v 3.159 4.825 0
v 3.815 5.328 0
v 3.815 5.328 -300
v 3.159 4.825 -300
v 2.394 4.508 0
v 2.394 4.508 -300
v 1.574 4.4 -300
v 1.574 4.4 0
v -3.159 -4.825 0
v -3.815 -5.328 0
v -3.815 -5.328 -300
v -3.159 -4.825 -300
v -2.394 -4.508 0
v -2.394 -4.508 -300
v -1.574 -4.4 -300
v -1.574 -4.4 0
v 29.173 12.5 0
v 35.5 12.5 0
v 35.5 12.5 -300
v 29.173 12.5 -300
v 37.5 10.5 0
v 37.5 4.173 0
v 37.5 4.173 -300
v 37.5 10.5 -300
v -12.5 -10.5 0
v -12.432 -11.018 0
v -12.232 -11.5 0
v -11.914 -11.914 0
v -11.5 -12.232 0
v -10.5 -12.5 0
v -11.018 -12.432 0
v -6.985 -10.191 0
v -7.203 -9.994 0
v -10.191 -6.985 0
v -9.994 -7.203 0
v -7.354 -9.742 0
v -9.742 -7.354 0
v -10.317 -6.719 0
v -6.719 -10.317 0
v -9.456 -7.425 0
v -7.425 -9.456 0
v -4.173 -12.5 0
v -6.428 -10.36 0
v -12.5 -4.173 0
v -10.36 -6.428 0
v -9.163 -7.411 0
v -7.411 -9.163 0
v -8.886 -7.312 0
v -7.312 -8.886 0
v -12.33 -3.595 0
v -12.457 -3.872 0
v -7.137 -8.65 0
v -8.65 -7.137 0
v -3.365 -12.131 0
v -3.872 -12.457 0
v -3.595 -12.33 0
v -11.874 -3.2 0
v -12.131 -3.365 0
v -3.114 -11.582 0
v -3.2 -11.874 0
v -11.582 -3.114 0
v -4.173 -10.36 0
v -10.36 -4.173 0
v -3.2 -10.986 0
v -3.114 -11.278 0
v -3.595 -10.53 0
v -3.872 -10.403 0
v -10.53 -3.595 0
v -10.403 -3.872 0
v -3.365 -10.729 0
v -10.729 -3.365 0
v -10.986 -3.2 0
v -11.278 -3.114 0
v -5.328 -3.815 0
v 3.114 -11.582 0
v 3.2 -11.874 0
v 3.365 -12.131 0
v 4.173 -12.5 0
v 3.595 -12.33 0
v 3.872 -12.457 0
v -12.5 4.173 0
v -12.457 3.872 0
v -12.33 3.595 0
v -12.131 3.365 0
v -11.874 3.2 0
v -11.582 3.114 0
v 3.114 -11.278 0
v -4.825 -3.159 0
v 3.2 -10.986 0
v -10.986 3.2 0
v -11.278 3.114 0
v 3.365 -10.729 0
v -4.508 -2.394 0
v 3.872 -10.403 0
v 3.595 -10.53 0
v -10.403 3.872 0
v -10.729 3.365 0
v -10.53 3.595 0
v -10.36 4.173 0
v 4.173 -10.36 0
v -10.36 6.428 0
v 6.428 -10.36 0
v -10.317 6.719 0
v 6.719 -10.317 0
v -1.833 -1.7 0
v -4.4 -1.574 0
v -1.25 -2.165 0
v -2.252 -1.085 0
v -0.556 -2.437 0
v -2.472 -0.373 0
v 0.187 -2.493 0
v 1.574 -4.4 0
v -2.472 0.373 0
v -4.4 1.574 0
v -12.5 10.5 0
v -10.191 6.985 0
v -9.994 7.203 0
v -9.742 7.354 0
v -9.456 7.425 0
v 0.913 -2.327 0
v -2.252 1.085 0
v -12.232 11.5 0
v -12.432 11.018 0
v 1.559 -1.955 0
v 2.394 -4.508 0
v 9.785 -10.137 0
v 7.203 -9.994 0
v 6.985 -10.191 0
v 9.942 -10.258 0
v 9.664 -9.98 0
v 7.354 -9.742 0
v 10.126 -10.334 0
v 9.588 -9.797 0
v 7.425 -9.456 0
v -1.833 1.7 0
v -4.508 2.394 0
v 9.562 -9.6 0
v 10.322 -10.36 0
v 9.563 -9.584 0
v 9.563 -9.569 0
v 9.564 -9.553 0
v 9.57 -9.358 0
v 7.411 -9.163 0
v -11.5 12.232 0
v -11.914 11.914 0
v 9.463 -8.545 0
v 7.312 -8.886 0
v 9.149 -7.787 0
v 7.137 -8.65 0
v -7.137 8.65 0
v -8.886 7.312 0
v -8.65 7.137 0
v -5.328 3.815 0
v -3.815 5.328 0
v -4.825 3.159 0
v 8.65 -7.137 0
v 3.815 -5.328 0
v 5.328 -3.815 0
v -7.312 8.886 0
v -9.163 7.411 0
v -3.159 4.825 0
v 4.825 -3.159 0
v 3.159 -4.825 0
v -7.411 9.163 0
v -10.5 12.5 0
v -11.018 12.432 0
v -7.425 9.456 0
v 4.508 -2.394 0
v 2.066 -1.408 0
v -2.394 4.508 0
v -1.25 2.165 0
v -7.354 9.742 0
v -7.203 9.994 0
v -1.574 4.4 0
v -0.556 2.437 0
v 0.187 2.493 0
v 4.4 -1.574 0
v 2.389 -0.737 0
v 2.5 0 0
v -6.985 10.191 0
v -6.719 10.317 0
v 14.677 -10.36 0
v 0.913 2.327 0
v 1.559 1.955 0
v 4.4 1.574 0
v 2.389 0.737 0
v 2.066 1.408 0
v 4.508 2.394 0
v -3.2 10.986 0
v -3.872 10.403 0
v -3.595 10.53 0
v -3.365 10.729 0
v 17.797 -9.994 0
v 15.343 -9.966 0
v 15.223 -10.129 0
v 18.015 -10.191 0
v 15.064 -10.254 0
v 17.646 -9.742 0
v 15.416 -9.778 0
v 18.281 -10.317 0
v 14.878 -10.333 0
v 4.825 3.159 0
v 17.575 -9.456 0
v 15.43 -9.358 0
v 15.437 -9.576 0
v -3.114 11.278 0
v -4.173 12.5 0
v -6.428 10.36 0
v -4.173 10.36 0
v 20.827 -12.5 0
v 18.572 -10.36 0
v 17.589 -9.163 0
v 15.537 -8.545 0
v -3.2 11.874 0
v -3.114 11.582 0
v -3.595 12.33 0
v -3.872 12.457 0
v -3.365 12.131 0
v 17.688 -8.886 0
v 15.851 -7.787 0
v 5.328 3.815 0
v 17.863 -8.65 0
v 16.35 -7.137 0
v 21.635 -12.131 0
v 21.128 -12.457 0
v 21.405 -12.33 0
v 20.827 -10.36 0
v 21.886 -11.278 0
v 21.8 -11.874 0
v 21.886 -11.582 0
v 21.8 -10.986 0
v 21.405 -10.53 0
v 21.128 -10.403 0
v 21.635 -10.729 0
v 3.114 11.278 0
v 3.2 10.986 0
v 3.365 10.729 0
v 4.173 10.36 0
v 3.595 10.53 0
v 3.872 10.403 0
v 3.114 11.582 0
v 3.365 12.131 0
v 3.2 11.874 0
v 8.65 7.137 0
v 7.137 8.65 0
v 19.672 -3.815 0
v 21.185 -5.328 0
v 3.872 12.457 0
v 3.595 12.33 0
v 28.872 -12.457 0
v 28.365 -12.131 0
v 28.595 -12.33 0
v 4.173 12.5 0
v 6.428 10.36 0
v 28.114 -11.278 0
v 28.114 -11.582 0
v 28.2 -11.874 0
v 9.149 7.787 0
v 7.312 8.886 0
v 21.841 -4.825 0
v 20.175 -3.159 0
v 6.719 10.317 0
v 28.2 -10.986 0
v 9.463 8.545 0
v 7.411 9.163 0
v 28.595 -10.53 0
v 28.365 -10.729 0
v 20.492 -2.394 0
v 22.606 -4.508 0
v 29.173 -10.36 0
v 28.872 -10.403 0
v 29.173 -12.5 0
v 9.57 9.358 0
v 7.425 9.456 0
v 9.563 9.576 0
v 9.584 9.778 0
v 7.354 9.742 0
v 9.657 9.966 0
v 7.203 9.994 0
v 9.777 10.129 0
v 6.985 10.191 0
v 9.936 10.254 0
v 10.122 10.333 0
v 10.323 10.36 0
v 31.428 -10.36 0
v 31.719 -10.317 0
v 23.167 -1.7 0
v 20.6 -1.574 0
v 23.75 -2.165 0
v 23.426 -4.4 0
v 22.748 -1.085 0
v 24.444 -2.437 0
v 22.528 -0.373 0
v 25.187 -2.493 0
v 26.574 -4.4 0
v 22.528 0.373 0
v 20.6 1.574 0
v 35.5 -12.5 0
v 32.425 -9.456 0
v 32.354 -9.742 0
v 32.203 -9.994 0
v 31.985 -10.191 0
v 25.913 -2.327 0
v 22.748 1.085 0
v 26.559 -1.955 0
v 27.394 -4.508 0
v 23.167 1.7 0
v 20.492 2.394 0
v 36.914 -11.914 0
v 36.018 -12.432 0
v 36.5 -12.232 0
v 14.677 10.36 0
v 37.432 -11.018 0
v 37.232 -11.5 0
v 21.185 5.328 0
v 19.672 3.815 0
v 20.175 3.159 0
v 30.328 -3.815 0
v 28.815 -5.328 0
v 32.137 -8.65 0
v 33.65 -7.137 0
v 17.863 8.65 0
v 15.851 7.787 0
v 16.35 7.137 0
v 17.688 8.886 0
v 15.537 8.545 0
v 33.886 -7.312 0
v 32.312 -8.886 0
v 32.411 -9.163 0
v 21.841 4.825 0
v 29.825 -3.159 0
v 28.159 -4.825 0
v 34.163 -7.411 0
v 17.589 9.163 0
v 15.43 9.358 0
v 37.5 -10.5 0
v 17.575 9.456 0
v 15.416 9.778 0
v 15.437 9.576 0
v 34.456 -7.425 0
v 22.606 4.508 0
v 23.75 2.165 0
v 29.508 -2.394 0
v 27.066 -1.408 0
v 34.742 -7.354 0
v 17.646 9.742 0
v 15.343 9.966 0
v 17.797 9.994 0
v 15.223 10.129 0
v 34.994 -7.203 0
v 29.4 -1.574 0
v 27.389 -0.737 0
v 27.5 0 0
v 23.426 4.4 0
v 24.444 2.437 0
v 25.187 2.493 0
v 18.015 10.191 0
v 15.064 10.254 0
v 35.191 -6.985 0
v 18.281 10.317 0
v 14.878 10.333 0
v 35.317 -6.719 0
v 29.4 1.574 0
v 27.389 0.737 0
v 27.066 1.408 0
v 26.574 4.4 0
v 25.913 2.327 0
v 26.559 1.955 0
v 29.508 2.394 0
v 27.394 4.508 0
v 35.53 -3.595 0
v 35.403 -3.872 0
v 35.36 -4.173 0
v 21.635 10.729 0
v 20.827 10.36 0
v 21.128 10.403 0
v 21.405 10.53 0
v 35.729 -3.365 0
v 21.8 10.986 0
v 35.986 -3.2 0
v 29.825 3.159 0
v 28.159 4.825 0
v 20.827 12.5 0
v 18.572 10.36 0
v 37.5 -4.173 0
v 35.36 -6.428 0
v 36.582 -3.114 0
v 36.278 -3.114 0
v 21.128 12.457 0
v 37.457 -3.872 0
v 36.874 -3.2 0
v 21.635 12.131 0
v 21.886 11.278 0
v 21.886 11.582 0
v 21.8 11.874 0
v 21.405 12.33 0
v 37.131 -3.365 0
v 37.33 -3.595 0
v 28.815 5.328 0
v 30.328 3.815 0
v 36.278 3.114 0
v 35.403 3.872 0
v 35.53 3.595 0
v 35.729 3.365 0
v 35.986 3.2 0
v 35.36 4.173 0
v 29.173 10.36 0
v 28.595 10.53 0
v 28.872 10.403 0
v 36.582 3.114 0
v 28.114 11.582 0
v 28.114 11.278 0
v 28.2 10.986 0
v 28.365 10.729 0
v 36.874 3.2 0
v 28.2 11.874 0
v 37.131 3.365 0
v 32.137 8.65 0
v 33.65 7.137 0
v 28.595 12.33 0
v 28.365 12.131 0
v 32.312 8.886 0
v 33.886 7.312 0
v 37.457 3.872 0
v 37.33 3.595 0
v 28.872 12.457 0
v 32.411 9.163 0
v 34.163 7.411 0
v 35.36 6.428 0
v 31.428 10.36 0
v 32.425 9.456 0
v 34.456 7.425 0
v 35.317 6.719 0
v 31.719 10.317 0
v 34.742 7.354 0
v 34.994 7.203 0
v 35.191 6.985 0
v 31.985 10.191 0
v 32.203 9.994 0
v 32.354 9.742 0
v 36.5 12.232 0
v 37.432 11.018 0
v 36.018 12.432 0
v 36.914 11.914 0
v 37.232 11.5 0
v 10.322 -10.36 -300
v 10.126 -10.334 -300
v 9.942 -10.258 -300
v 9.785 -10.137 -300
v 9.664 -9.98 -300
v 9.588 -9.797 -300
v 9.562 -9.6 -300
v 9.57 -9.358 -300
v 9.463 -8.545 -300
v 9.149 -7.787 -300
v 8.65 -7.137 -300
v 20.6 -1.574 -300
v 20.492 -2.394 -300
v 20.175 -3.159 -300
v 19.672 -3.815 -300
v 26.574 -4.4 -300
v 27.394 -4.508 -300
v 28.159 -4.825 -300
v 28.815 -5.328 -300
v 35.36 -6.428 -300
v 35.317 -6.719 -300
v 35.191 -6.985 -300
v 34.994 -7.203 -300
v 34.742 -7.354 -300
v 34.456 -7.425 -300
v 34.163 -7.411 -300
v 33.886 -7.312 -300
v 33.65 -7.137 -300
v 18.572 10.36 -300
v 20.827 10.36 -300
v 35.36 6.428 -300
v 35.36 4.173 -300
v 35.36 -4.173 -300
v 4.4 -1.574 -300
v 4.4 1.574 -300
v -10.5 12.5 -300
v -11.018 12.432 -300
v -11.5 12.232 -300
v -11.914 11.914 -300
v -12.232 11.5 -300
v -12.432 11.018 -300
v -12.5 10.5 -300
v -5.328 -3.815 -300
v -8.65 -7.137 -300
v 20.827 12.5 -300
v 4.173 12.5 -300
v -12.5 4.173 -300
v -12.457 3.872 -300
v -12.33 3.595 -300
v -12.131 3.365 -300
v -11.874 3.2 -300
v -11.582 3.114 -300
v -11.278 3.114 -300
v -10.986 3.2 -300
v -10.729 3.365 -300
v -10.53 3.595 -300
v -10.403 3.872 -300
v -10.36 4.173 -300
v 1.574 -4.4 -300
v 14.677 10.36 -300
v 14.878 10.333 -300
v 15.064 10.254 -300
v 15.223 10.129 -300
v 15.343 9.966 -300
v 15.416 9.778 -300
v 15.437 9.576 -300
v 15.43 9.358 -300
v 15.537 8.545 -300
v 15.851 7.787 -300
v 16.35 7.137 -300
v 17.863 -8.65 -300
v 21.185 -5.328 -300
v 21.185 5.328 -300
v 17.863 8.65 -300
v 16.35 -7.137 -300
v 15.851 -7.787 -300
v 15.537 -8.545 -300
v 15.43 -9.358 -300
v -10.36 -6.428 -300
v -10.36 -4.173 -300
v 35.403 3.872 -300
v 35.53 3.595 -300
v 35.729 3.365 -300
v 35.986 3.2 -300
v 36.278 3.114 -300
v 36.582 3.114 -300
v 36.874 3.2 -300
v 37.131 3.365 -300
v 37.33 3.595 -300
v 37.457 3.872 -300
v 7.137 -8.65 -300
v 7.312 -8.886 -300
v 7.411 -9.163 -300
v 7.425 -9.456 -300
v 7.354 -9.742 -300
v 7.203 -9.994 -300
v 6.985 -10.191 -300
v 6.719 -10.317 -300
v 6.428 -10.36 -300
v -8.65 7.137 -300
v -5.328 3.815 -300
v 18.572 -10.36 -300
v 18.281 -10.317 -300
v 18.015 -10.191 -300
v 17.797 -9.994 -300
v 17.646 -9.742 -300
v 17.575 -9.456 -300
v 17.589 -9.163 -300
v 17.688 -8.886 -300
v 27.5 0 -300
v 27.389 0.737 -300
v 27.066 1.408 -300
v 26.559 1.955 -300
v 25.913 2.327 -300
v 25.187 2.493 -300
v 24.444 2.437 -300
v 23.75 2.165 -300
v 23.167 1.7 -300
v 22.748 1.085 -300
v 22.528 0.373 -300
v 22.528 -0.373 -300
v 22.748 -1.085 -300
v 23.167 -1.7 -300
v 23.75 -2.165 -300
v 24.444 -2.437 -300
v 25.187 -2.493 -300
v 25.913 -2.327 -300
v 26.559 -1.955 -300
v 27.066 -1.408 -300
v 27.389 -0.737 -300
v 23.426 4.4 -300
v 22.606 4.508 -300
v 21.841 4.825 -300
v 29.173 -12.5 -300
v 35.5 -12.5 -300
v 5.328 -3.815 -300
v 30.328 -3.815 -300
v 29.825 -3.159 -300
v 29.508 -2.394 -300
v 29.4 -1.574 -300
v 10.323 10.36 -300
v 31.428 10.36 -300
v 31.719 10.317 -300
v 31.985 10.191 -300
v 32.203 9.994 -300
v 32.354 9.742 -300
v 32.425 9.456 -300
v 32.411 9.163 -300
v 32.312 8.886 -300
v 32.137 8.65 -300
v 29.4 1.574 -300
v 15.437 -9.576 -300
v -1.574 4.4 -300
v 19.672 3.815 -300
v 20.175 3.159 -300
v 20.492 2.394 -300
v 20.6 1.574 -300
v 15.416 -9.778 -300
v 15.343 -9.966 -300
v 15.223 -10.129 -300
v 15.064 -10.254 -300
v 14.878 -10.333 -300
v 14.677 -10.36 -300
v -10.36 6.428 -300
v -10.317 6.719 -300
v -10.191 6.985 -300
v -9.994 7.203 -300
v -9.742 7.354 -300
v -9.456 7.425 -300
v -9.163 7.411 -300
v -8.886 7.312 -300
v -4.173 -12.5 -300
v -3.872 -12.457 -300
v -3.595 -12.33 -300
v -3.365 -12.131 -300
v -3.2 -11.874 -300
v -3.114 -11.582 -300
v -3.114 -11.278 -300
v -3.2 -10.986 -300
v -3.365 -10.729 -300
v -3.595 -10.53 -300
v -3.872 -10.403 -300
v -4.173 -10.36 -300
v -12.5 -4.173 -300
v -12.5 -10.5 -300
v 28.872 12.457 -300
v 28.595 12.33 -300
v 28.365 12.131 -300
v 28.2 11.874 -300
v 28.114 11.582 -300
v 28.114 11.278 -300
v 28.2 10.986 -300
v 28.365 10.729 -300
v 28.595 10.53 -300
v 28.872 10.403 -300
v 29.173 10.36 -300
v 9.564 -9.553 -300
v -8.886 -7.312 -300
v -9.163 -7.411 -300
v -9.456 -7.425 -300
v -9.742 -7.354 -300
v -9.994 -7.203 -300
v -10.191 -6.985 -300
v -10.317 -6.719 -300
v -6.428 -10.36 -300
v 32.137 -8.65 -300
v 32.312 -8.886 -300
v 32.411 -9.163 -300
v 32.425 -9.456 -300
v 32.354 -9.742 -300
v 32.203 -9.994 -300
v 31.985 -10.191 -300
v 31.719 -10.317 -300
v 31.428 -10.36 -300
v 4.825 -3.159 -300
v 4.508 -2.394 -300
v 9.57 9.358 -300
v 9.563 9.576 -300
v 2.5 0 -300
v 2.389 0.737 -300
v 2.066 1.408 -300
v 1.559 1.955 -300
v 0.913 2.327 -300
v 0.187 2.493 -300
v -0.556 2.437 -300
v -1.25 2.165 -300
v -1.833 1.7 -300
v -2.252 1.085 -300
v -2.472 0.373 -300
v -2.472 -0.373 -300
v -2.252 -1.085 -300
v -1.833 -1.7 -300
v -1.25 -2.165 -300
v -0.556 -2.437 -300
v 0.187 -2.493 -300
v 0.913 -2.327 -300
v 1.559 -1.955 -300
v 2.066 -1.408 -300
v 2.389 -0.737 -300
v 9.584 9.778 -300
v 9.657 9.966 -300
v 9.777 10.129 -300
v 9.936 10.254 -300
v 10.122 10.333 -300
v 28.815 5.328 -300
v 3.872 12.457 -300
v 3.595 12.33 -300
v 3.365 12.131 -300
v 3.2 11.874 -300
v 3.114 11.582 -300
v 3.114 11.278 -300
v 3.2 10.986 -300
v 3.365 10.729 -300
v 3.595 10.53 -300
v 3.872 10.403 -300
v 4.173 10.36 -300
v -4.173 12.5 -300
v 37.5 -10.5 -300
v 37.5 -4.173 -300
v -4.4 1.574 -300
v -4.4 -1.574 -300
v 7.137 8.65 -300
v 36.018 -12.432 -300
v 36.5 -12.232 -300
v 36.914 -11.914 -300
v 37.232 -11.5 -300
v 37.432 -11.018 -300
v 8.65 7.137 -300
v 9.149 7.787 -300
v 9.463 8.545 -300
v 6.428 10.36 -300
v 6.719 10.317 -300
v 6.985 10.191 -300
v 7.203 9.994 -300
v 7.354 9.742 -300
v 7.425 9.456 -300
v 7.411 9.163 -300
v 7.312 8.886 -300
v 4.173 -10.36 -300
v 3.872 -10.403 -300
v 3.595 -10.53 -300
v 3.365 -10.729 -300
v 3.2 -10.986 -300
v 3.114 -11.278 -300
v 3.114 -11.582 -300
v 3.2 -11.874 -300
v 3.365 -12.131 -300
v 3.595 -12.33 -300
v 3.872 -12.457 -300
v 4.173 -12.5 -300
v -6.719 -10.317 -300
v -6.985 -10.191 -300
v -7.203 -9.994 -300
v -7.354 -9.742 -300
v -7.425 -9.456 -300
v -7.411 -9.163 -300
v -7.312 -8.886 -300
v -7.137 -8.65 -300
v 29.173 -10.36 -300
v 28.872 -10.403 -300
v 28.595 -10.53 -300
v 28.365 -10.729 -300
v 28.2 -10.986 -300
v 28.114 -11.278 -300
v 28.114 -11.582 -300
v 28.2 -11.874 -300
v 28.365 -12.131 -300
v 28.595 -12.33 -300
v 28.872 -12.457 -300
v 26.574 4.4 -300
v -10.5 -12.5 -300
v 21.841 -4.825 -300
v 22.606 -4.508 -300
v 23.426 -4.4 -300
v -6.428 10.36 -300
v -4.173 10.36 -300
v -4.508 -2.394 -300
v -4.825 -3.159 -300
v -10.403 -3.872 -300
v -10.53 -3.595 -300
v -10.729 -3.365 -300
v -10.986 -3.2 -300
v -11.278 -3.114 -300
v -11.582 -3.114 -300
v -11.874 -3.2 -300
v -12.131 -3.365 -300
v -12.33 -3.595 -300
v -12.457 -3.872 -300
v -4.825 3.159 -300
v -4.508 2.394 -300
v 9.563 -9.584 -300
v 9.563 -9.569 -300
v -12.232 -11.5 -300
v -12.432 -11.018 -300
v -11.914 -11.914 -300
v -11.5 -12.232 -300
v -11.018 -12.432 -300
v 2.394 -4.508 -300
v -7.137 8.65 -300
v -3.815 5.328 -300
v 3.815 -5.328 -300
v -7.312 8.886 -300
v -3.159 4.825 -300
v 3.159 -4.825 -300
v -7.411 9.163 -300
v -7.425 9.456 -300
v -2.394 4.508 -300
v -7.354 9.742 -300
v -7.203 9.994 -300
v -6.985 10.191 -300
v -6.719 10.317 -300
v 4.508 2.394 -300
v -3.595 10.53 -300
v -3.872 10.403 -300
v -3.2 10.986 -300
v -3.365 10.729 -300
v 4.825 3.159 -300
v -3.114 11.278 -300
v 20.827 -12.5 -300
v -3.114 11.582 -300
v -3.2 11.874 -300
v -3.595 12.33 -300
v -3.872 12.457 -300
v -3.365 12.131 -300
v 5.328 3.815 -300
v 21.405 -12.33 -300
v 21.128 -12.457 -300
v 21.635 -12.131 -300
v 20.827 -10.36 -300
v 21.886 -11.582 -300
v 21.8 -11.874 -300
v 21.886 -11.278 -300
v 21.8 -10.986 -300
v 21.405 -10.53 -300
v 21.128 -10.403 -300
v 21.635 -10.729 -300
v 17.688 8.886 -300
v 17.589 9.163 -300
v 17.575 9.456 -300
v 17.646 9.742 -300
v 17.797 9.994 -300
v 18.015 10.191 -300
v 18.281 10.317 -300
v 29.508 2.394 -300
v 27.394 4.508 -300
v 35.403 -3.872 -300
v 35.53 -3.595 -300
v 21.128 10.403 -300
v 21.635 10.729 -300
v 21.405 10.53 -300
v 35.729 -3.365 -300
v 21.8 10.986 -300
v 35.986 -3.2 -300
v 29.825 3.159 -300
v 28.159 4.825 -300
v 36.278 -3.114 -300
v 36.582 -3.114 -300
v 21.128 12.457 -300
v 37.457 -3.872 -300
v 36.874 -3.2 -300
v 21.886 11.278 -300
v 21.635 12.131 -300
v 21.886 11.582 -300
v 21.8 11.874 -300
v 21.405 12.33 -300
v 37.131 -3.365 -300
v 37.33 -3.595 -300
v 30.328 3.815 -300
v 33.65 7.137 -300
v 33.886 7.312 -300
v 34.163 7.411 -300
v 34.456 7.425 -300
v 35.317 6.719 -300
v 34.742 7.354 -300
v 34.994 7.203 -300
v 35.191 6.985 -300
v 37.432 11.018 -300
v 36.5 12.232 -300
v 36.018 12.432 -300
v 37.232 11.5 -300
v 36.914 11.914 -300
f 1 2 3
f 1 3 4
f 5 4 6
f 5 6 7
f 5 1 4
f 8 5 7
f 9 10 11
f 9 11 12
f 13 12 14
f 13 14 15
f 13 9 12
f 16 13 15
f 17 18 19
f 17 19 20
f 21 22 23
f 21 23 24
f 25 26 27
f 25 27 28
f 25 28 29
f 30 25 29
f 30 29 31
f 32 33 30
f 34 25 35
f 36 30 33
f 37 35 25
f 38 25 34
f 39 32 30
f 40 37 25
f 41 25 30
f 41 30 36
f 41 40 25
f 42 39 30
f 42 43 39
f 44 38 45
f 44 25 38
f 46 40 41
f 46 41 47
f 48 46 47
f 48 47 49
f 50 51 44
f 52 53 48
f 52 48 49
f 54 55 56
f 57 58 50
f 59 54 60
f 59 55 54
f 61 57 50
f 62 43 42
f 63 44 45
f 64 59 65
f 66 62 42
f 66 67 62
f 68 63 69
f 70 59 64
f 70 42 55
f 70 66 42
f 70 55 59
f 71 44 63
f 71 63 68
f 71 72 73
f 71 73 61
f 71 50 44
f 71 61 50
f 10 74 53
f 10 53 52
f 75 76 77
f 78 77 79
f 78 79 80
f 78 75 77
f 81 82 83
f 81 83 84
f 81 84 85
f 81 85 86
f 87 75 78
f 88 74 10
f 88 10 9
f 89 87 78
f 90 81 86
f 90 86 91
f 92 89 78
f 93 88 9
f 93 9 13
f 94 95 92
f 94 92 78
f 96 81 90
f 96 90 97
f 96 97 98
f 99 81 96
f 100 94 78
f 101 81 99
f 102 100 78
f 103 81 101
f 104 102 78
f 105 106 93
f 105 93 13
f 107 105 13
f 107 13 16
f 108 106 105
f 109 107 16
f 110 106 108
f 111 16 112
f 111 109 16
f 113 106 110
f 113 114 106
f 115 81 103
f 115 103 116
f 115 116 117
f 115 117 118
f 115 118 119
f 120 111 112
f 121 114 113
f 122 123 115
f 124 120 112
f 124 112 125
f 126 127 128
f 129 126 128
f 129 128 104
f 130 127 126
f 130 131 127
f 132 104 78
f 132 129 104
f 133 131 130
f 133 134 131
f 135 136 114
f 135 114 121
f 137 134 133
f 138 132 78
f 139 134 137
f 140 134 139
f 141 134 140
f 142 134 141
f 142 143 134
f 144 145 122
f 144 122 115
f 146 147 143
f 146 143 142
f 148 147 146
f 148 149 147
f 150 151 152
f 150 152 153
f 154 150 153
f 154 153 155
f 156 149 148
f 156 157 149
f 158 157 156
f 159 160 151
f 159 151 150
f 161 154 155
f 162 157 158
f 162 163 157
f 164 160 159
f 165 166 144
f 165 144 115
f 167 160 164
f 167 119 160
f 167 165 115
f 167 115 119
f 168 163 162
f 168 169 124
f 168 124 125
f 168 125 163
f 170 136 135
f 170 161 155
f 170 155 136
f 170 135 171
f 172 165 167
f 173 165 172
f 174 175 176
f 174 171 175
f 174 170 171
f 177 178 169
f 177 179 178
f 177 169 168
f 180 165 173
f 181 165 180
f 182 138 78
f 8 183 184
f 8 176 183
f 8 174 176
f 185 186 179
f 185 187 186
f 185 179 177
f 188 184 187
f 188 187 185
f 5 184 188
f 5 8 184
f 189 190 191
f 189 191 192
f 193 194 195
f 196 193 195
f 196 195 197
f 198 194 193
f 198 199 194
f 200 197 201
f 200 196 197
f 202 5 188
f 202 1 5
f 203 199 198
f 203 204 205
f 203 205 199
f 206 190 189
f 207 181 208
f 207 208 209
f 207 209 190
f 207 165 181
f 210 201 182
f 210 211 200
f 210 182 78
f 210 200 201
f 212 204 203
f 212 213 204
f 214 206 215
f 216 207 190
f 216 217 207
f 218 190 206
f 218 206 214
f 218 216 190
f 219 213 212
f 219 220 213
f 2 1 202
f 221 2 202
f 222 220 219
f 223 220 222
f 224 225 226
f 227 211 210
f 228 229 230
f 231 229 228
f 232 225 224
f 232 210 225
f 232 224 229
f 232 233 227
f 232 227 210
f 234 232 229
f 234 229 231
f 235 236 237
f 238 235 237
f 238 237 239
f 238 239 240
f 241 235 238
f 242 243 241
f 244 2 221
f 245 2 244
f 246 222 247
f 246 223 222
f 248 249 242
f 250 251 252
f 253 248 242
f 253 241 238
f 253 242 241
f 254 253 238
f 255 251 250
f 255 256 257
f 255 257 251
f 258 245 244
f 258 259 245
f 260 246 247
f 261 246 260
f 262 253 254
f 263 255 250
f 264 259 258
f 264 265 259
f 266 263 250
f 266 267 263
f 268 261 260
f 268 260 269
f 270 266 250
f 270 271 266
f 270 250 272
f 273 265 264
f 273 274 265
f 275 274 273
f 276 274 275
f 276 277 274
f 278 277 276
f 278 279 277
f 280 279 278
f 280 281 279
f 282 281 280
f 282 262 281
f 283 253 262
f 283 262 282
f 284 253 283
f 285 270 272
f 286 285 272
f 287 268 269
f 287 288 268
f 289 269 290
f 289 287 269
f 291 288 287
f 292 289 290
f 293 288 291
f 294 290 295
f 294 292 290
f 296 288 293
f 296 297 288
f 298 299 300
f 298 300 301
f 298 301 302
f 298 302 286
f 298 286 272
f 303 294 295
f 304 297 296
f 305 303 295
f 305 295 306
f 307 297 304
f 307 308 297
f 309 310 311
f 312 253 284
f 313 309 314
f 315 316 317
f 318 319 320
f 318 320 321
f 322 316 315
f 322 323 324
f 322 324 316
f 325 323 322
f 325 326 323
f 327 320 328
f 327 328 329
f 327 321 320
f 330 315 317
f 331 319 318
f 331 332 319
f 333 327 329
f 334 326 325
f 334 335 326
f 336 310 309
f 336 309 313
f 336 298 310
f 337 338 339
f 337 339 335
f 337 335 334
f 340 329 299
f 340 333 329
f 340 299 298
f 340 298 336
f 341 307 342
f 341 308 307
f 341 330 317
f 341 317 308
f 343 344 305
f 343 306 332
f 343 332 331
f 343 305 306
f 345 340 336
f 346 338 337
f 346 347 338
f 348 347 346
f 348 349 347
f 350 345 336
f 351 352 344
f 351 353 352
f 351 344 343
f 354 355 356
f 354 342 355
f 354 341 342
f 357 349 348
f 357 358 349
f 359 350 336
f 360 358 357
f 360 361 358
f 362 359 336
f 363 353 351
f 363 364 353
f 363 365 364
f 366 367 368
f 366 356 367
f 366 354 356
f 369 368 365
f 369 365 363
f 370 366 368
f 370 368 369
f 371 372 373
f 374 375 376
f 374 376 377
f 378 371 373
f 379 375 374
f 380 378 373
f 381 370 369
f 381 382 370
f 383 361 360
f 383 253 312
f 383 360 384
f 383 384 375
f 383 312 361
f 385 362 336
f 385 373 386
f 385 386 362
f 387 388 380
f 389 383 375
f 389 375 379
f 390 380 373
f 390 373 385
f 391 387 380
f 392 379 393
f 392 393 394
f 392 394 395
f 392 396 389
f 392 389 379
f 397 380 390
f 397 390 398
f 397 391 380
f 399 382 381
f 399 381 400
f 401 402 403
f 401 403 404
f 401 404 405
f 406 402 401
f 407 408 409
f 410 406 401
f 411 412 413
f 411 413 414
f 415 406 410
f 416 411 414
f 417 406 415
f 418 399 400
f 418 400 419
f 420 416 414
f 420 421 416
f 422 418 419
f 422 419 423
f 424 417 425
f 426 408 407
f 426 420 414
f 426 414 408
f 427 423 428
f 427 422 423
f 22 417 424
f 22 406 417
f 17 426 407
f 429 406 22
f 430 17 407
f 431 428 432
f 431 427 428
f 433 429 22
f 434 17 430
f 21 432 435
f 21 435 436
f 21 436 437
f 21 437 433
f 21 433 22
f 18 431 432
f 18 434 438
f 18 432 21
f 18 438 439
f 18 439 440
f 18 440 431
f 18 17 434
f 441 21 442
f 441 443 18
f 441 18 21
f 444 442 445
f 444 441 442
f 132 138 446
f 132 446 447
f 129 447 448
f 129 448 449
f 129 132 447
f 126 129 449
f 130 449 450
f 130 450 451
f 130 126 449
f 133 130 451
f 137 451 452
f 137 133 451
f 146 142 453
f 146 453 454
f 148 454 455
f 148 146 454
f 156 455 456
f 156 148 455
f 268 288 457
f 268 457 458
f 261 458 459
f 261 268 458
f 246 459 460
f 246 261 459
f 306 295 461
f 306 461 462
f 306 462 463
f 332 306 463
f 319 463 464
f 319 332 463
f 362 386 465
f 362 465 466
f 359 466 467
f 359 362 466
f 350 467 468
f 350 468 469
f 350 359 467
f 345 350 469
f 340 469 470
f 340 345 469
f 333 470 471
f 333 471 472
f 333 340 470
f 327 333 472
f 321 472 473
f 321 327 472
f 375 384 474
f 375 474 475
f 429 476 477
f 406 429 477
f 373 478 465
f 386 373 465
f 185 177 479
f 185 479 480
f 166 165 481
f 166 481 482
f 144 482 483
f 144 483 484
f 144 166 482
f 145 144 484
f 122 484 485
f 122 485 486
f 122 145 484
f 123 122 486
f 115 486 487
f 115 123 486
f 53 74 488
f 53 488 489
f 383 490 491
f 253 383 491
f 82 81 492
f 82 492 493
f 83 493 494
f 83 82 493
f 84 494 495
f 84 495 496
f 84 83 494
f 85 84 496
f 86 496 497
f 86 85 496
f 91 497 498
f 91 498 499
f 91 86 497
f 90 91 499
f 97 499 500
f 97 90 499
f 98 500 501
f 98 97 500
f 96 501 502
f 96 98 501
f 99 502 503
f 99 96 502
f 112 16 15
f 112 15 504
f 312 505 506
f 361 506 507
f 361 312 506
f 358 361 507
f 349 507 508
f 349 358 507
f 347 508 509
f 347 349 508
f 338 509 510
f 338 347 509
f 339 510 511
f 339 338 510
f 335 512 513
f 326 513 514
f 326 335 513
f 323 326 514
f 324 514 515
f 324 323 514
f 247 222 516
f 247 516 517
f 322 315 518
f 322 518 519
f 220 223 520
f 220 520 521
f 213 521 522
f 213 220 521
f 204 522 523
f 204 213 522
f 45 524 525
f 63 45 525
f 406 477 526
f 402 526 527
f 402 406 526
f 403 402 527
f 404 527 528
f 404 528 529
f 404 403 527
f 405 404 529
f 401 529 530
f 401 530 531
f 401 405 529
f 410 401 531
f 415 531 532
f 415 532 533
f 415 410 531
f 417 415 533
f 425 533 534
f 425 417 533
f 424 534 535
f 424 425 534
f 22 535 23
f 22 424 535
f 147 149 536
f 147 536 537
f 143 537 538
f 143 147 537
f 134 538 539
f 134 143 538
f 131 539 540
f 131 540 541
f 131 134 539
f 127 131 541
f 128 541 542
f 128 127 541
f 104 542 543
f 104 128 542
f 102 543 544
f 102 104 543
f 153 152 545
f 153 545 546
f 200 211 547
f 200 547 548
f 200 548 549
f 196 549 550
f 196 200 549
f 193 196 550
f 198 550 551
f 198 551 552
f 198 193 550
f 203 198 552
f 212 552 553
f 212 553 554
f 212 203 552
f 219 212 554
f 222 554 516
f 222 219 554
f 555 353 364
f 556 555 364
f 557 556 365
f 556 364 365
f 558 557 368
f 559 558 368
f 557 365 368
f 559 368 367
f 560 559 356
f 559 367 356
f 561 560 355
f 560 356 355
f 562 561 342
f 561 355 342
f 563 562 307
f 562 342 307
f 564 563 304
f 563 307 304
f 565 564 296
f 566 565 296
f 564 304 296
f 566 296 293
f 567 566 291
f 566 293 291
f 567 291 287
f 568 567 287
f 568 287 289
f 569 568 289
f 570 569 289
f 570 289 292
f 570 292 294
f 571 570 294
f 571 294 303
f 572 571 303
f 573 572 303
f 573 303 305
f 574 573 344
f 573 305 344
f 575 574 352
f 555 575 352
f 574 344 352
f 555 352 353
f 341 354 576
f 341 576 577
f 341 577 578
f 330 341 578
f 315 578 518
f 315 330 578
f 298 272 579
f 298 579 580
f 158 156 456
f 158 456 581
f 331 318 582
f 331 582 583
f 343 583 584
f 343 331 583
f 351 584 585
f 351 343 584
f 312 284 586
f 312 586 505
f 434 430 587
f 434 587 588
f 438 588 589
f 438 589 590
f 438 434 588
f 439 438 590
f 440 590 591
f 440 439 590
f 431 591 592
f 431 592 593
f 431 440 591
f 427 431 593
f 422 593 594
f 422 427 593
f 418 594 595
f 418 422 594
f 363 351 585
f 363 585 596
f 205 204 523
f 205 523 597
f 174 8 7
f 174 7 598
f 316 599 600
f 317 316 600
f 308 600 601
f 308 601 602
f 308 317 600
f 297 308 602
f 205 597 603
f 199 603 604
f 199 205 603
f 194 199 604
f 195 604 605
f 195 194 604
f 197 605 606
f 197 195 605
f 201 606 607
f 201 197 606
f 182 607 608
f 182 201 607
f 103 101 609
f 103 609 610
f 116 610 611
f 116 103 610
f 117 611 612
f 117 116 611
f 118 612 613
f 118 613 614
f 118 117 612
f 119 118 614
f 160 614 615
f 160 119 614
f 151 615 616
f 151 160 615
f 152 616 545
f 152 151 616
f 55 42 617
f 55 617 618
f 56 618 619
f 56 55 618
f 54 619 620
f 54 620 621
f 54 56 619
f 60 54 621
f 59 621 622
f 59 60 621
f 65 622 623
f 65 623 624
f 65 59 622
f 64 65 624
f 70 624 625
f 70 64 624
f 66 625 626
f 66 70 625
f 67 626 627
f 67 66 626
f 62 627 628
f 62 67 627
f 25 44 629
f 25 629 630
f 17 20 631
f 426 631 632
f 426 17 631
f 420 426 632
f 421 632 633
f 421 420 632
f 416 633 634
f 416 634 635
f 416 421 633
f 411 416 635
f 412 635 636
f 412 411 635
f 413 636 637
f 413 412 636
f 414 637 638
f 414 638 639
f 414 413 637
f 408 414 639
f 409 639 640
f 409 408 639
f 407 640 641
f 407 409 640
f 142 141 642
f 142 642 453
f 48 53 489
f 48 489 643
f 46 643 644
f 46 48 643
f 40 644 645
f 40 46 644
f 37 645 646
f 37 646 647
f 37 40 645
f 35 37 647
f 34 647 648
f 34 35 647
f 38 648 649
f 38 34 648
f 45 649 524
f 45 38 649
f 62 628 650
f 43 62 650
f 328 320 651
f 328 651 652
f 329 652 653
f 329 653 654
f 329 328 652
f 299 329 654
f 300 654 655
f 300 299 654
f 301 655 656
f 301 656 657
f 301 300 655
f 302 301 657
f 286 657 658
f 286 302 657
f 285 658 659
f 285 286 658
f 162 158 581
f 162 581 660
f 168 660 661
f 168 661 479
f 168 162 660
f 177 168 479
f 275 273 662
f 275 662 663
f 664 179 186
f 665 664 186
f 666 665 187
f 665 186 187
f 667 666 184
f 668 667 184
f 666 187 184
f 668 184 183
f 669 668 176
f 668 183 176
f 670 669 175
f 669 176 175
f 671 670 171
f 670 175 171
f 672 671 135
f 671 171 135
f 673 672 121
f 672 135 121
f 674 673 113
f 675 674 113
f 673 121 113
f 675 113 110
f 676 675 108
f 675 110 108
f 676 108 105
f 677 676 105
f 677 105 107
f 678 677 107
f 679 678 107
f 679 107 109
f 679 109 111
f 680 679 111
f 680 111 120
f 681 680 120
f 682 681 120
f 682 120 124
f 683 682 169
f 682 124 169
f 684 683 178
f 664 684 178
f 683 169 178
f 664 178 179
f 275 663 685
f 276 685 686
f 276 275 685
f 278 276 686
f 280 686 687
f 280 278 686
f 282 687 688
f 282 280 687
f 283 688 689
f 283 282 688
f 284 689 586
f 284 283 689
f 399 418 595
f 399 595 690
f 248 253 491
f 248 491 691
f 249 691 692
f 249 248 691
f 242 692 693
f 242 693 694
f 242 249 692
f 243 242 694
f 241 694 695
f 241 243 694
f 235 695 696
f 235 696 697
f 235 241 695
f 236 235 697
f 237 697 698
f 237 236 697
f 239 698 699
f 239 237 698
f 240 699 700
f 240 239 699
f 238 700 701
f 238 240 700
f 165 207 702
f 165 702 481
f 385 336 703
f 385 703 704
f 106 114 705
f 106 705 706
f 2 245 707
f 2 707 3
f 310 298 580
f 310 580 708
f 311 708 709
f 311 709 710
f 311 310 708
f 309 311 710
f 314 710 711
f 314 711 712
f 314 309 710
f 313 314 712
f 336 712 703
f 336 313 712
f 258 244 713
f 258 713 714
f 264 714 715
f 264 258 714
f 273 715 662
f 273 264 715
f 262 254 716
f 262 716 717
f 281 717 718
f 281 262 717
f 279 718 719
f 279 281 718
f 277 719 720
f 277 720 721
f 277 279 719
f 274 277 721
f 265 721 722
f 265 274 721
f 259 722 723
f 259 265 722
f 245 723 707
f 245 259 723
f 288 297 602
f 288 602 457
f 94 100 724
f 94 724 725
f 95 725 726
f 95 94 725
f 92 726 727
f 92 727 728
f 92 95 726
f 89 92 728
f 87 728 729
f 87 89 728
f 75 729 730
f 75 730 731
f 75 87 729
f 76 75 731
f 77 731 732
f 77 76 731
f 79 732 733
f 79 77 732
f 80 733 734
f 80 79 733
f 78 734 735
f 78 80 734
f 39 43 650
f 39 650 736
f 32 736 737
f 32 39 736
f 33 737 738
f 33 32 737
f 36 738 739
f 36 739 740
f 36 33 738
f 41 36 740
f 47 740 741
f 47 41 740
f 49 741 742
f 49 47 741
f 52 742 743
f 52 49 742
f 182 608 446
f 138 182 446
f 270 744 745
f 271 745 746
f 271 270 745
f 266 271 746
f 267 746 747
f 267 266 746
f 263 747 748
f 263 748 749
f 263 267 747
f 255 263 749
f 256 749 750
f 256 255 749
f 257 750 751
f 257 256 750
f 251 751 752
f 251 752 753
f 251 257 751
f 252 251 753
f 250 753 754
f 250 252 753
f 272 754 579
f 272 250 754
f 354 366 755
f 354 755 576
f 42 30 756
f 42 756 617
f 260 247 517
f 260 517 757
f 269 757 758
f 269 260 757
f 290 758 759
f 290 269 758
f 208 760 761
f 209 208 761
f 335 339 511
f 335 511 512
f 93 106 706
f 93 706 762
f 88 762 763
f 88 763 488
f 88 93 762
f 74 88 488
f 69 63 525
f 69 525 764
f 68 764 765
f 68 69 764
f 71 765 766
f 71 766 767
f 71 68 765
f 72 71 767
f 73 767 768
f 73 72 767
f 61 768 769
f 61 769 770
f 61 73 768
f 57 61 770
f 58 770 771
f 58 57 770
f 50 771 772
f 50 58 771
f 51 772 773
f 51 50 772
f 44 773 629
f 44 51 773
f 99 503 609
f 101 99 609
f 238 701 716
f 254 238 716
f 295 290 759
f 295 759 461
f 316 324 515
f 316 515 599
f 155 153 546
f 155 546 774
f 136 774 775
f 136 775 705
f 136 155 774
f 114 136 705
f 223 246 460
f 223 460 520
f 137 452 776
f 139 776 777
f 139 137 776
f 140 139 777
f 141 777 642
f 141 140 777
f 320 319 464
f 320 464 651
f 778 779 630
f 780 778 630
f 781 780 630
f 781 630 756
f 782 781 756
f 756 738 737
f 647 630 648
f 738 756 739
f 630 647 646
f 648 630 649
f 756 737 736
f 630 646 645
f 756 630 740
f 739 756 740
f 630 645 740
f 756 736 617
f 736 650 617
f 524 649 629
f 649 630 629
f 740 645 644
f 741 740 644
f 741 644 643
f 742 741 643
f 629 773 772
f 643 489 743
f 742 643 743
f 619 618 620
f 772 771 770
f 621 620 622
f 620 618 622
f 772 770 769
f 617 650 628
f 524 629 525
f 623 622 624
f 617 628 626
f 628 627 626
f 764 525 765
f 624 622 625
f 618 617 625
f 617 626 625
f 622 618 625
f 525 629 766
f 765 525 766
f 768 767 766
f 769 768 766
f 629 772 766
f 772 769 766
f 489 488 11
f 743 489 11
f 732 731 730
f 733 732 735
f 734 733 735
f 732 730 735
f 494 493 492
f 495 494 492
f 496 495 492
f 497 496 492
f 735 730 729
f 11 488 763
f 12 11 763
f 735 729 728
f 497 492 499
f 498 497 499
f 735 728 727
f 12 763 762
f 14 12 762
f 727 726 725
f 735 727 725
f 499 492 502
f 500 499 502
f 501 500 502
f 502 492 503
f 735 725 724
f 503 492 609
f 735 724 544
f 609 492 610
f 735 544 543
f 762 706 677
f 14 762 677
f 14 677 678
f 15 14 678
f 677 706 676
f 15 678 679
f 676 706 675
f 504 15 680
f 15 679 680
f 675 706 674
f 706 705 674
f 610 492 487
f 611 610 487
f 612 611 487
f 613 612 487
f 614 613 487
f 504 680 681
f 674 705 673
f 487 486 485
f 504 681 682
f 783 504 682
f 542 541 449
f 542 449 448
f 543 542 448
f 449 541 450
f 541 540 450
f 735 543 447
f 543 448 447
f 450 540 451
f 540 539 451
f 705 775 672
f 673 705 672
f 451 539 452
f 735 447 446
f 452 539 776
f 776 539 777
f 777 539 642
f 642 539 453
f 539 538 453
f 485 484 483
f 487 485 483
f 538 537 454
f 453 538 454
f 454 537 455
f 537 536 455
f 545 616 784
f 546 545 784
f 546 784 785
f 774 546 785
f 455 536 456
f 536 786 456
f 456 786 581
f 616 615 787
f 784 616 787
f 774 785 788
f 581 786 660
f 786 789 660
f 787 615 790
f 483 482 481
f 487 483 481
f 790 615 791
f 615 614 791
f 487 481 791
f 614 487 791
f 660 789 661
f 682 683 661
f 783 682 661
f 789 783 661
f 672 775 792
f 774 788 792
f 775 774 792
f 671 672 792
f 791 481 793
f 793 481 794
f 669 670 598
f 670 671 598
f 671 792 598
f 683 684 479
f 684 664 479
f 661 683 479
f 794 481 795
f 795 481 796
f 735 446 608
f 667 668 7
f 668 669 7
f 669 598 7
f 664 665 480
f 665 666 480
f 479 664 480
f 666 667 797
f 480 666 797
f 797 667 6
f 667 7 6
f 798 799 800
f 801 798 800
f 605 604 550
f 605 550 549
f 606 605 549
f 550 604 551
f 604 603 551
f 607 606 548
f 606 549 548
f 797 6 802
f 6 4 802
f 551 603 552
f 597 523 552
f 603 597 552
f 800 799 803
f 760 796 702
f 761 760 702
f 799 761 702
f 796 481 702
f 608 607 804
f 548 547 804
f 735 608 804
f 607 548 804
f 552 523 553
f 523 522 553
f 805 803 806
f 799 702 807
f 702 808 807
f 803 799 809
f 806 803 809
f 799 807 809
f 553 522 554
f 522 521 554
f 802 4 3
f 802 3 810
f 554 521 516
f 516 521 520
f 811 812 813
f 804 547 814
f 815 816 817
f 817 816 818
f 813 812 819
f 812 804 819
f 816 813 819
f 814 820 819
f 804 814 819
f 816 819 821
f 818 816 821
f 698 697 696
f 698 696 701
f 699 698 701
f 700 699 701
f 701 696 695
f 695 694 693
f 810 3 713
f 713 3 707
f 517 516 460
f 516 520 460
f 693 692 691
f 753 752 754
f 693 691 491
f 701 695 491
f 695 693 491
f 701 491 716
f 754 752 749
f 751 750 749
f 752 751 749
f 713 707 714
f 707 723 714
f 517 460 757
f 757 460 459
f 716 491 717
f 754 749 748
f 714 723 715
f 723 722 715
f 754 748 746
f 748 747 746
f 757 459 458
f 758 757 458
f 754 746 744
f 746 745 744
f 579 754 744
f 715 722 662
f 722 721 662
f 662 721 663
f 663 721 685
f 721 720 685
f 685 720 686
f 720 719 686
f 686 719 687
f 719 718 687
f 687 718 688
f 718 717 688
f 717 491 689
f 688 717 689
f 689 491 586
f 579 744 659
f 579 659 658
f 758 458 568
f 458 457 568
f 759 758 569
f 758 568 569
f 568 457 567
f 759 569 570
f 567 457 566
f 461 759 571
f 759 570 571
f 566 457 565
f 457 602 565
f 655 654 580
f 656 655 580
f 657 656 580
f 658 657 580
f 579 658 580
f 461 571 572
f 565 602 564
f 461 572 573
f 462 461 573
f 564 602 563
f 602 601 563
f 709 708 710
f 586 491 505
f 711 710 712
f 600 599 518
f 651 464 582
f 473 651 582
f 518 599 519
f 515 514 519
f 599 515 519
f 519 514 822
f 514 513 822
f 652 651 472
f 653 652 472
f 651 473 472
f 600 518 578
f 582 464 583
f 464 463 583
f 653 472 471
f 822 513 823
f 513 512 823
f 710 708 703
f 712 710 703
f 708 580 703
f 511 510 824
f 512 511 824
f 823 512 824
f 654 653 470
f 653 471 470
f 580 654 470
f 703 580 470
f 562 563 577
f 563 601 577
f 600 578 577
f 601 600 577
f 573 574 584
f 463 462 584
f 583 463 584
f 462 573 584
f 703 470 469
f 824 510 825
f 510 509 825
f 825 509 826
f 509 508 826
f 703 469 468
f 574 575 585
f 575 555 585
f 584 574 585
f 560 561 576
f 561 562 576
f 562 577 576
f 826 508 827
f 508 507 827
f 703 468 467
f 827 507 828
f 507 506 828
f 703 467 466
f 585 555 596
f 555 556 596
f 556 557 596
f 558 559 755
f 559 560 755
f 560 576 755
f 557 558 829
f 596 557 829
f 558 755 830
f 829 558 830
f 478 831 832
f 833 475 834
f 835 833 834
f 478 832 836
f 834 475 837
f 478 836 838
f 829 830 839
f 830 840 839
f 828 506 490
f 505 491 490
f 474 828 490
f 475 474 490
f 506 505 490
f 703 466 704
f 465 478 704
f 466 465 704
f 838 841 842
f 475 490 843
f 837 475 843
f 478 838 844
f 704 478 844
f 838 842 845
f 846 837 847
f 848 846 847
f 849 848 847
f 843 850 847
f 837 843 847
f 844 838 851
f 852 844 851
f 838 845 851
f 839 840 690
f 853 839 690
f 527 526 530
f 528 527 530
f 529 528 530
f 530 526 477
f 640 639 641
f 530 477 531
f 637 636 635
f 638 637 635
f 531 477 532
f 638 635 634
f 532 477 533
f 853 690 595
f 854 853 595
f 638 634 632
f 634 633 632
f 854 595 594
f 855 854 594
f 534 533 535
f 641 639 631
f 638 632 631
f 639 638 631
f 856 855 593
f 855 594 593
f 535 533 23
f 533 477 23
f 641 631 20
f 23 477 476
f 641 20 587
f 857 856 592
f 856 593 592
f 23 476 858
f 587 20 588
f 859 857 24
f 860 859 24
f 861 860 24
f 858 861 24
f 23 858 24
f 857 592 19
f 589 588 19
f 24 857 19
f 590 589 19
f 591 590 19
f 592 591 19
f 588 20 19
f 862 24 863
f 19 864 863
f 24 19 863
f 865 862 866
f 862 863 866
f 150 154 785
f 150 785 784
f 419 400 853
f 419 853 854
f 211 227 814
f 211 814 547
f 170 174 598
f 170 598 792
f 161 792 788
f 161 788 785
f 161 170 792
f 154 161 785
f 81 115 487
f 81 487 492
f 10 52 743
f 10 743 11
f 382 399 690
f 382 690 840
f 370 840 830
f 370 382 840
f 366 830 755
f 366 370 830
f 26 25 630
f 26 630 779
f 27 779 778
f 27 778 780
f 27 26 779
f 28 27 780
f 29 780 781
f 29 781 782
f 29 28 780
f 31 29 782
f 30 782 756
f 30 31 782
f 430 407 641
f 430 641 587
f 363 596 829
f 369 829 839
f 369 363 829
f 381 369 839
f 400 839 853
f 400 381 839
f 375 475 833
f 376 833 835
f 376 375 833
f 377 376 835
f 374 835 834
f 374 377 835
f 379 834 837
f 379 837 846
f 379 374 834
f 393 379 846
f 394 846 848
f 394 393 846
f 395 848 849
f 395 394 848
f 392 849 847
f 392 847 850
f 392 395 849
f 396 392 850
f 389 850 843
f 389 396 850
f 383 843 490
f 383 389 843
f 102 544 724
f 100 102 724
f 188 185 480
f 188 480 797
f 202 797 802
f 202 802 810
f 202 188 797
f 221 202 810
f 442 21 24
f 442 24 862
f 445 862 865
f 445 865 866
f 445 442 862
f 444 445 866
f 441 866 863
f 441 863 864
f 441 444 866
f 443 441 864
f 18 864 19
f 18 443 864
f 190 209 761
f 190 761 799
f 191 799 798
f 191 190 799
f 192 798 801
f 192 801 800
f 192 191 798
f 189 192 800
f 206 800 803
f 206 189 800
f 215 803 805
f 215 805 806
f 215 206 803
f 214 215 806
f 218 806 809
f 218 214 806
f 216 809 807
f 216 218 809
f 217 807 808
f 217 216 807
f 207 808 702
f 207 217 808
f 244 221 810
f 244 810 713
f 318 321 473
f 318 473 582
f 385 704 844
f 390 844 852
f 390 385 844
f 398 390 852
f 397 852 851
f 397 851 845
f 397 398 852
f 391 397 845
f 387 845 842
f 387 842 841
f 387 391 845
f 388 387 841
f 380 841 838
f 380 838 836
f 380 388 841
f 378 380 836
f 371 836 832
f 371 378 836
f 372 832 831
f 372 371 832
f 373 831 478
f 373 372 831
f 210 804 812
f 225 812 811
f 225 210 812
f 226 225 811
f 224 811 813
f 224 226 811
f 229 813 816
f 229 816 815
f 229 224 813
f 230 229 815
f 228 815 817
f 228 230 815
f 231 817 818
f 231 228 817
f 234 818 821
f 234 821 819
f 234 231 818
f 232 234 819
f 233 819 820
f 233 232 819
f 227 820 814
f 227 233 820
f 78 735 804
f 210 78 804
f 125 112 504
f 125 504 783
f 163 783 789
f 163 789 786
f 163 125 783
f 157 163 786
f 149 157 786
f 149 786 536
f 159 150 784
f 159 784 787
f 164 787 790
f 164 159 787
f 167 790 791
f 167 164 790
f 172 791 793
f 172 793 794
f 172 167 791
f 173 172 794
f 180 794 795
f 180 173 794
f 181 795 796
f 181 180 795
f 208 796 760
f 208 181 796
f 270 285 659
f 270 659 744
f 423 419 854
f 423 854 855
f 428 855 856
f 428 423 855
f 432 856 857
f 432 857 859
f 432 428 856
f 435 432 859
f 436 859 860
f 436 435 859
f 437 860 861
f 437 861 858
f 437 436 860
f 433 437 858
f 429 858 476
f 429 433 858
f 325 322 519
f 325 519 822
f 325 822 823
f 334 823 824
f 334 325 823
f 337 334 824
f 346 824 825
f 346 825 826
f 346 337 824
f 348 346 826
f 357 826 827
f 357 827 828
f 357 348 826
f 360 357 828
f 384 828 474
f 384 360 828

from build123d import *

# Parameters (mm, degrees)
SKETCH1_R      = 2.5
EXTRUDE1_DEPTH = 300


with BuildPart() as part:
    # Sketch1 → Extrude1 (new body)
    with BuildSketch(Plane.XY):
        with BuildLine():
            ThreePointArc((-10.5, 12.5), (-11.914213562, 11.914213562), (-12.5, 10.5))
            Line((-12.5, 10.5), (-12.5, 4.173306336))
            ThreePointArc((-12.5, 4.173306336), (-11.43, 3.103306336), (-10.36, 4.173306336))
            Line((-10.36, 4.173306336), (-10.36, 6.428177131))
            ThreePointArc((-10.36, 6.428177131), (-9.741558145, 7.353740775), (-8.649781387, 7.136572875))
            Line((-8.649781387, 7.136572875), (-5.328471504, 3.815262992))
            ThreePointArc((-5.328471504, 3.815262992), (-4.641301882, 2.786840976), (-4.4, 1.573734496))
            Line((-4.4, 1.573734496), (-4.4, -1.573734496))
            ThreePointArc((-4.4, -1.573734496), (-4.641301882, -2.786840976), (-5.328471504, -3.815262992))
            Line((-5.328471504, -3.815262992), (-8.649781387, -7.136572875))
            ThreePointArc((-8.649781387, -7.136572875), (-9.741558145, -7.353740775), (-10.36, -6.428177131))
            Line((-10.36, -6.428177131), (-10.36, -4.173306336))
            ThreePointArc((-10.36, -4.173306336), (-11.43, -3.103306336), (-12.5, -4.173306336))
            Line((-12.5, -4.173306336), (-12.5, -10.5))
            ThreePointArc((-12.5, -10.5), (-11.914213562, -11.914213562), (-10.5, -12.5))
            Line((-10.5, -12.5), (-4.173306336, -12.5))
            ThreePointArc((-4.173306336, -12.5), (-3.103306336, -11.43), (-4.173306336, -10.36))
            Line((-4.173306336, -10.36), (-6.428177131, -10.36))
            ThreePointArc((-6.428177131, -10.36), (-7.353740775, -9.741558145), (-7.136572875, -8.649781387))
            Line((-7.136572875, -8.649781387), (-3.815262992, -5.328471504))
            ThreePointArc((-3.815262992, -5.328471504), (-2.786840976, -4.641301882), (-1.573734496, -4.4))
            Line((-1.573734496, -4.4), (1.573734496, -4.4))
            ThreePointArc((1.573734496, -4.4), (2.786840976, -4.641301882), (3.815262992, -5.328471504))
            Line((3.815262992, -5.328471504), (7.136572875, -8.649781387))
            ThreePointArc((7.136572875, -8.649781387), (7.353740775, -9.741558145), (6.428177131, -10.36))
            Line((6.428177131, -10.36), (4.173306336, -10.36))
            ThreePointArc((4.173306336, -10.36), (3.103306336, -11.43), (4.173306336, -12.5))
            Line((4.173306336, -12.5), (20.826693664, -12.5))
            ThreePointArc((20.826693664, -12.5), (21.896693664, -11.43), (20.826693664, -10.36))
            Line((20.826693664, -10.36), (18.571822869, -10.36))
            ThreePointArc((18.571822869, -10.36), (17.646259225, -9.741558145), (17.863427125, -8.649781387))
            Line((17.863427125, -8.649781387), (21.184737008, -5.328471504))
            ThreePointArc((21.184737008, -5.328471504), (22.213159024, -4.641301882), (23.426265504, -4.4))
            Line((23.426265504, -4.4), (26.573734496, -4.4))
            ThreePointArc((26.573734496, -4.4), (27.786840976, -4.641301882), (28.815262992, -5.328471504))
            Line((28.815262992, -5.328471504), (32.136572875, -8.649781387))
            ThreePointArc((32.136572875, -8.649781387), (32.353740775, -9.741558145), (31.428177131, -10.36))
            Line((31.428177131, -10.36), (29.173306336, -10.36))
            ThreePointArc((29.173306336, -10.36), (28.103306336, -11.43), (29.173306336, -12.5))
            Line((29.173306336, -12.5), (35.5, -12.5))
            ThreePointArc((35.5, -12.5), (36.914213562, -11.914213562), (37.5, -10.5))
            Line((37.5, -10.5), (37.5, -4.173306336))
            ThreePointArc((37.5, -4.173306336), (36.43, -3.103306336), (35.36, -4.173306336))
            Line((35.36, -4.173306336), (35.36, -6.428177131))
            ThreePointArc((35.36, -6.428177131), (34.741558145, -7.353740775), (33.649781387, -7.136572875))
            Line((33.649781387, -7.136572875), (30.328471504, -3.815262992))
            ThreePointArc((30.328471504, -3.815262992), (29.641301882, -2.786840976), (29.4, -1.573734496))
            Line((29.4, -1.573734496), (29.4, 1.573734496))
            ThreePointArc((29.4, 1.573734496), (29.641301882, 2.786840976), (30.328471504, 3.815262992))
            Line((30.328471504, 3.815262992), (33.649781387, 7.136572875))
            ThreePointArc((33.649781387, 7.136572875), (34.741558145, 7.353740775), (35.36, 6.428177131))
            Line((35.36, 6.428177131), (35.36, 4.173306336))
            ThreePointArc((35.36, 4.173306336), (36.43, 3.103306336), (37.5, 4.173306336))
            Line((37.5, 4.173306336), (37.5, 10.5))
            ThreePointArc((37.5, 10.5), (36.914213562, 11.914213562), (35.5, 12.5))
            Line((35.5, 12.5), (29.173306336, 12.5))
            ThreePointArc((29.173306336, 12.5), (28.103306336, 11.43), (29.173306336, 10.36))
            Line((29.173306336, 10.36), (31.428177131, 10.36))
            ThreePointArc((31.428177131, 10.36), (32.353740775, 9.741558145), (32.136572875, 8.649781387))
            Line((32.136572875, 8.649781387), (28.815262992, 5.328471504))
            ThreePointArc((28.815262992, 5.328471504), (27.786840976, 4.641301882), (26.573734496, 4.4))
            Line((26.573734496, 4.4), (23.426265504, 4.4))
            ThreePointArc((23.426265504, 4.4), (22.213159024, 4.641301882), (21.184737008, 5.328471504))
            Line((21.184737008, 5.328471504), (17.863427125, 8.649781387))
            ThreePointArc((17.863427125, 8.649781387), (17.646259225, 9.741558145), (18.571822869, 10.36))
            Line((18.571822869, 10.36), (20.826693664, 10.36))
            ThreePointArc((20.826693664, 10.36), (21.896693664, 11.43), (20.826693664, 12.5))
            Line((20.826693664, 12.5), (4.173306336, 12.5))
            ThreePointArc((4.173306336, 12.5), (3.103306336, 11.43), (4.173306336, 10.36))
            Line((4.173306336, 10.36), (6.428177131, 10.36))
            ThreePointArc((6.428177131, 10.36), (7.353740775, 9.741558145), (7.136572875, 8.649781387))
            Line((7.136572875, 8.649781387), (3.815262992, 5.328471504))
            ThreePointArc((3.815262992, 5.328471504), (2.786840976, 4.641301882), (1.573734496, 4.4))
            Line((1.573734496, 4.4), (-1.573734496, 4.4))
            ThreePointArc((-1.573734496, 4.4), (-2.786840976, 4.641301882), (-3.815262992, 5.328471504))
            Line((-3.815262992, 5.328471504), (-7.136572875, 8.649781387))
            ThreePointArc((-7.136572875, 8.649781387), (-7.353740775, 9.741558145), (-6.428177131, 10.36))
            Line((-6.428177131, 10.36), (-4.173306336, 10.36))
            ThreePointArc((-4.173306336, 10.36), (-3.103306336, 11.43), (-4.173306336, 12.5))
            Line((-4.173306336, 12.5), (-10.5, 12.5))
        make_face()
        Circle(SKETCH1_R, mode=Mode.SUBTRACT)
        with BuildLine():
            Line((9.563960111, -9.552897559), (9.57, -9.358177131))
            ThreePointArc((9.57, -9.358177131), (9.330842974, -8.155853572), (8.649781387, -7.136572875))
            Line((8.649781387, -7.136572875), (5.328471504, -3.815262992))
            ThreePointArc((5.328471504, -3.815262992), (4.641301882, -2.786840976), (4.4, -1.573734496))
            Line((4.4, -1.573734496), (4.4, 1.573734496))
            ThreePointArc((4.4, 1.573734496), (4.641301882, 2.786840976), (5.328471504, 3.815262992))
            Line((5.328471504, 3.815262992), (8.649781387, 7.136572875))
            ThreePointArc((8.649781387, 7.136572875), (9.330842974, 8.155853572), (9.57, 9.358177131))
            Line((9.57, 9.358177131), (9.563229944, 9.576437453))
            ThreePointArc((9.563229944, 9.576437453), (9.777196412, 10.129004945), (10.322864597, 10.36))
            Line((10.322864597, 10.36), (14.677135403, 10.36))
            ThreePointArc((14.677135403, 10.36), (15.222803588, 10.129004945), (15.436770056, 9.576437453))
            Line((15.436770056, 9.576437453), (15.43, 9.358177131))
            ThreePointArc((15.43, 9.358177131), (15.669157026, 8.155853572), (16.350218613, 7.136572875))
            Line((16.350218613, 7.136572875), (19.671528496, 3.815262992))
            ThreePointArc((19.671528496, 3.815262992), (20.358698118, 2.786840976), (20.6, 1.573734496))
            Line((20.6, 1.573734496), (20.6, -1.573734496))
            ThreePointArc((20.6, -1.573734496), (20.358698118, -2.786840976), (19.671528496, -3.815262992))
            Line((19.671528496, -3.815262992), (16.350218613, -7.136572875))
            ThreePointArc((16.350218613, -7.136572875), (15.669157026, -8.155853572), (15.43, -9.358177131))
            Line((15.43, -9.358177131), (15.436770056, -9.576437453))
            ThreePointArc((15.436770056, -9.576437453), (15.222803588, -10.129004945), (14.677135403, -10.36))
            Line((14.677135403, -10.36), (10.322499075, -10.36))
            ThreePointArc((10.322499075, -10.36), (9.785097921, -10.137401154), (9.562499075, -9.6))
            ThreePointArc((9.562499075, -9.6), (9.562864421, -9.576437453), (9.563960111, -9.552897559))
        make_face(mode=Mode.SUBTRACT)
        with Locations((25, 0)):
            Circle(SKETCH1_R, mode=Mode.SUBTRACT)
    extrude(amount=-EXTRUDE1_DEPTH)


solid = part.part
